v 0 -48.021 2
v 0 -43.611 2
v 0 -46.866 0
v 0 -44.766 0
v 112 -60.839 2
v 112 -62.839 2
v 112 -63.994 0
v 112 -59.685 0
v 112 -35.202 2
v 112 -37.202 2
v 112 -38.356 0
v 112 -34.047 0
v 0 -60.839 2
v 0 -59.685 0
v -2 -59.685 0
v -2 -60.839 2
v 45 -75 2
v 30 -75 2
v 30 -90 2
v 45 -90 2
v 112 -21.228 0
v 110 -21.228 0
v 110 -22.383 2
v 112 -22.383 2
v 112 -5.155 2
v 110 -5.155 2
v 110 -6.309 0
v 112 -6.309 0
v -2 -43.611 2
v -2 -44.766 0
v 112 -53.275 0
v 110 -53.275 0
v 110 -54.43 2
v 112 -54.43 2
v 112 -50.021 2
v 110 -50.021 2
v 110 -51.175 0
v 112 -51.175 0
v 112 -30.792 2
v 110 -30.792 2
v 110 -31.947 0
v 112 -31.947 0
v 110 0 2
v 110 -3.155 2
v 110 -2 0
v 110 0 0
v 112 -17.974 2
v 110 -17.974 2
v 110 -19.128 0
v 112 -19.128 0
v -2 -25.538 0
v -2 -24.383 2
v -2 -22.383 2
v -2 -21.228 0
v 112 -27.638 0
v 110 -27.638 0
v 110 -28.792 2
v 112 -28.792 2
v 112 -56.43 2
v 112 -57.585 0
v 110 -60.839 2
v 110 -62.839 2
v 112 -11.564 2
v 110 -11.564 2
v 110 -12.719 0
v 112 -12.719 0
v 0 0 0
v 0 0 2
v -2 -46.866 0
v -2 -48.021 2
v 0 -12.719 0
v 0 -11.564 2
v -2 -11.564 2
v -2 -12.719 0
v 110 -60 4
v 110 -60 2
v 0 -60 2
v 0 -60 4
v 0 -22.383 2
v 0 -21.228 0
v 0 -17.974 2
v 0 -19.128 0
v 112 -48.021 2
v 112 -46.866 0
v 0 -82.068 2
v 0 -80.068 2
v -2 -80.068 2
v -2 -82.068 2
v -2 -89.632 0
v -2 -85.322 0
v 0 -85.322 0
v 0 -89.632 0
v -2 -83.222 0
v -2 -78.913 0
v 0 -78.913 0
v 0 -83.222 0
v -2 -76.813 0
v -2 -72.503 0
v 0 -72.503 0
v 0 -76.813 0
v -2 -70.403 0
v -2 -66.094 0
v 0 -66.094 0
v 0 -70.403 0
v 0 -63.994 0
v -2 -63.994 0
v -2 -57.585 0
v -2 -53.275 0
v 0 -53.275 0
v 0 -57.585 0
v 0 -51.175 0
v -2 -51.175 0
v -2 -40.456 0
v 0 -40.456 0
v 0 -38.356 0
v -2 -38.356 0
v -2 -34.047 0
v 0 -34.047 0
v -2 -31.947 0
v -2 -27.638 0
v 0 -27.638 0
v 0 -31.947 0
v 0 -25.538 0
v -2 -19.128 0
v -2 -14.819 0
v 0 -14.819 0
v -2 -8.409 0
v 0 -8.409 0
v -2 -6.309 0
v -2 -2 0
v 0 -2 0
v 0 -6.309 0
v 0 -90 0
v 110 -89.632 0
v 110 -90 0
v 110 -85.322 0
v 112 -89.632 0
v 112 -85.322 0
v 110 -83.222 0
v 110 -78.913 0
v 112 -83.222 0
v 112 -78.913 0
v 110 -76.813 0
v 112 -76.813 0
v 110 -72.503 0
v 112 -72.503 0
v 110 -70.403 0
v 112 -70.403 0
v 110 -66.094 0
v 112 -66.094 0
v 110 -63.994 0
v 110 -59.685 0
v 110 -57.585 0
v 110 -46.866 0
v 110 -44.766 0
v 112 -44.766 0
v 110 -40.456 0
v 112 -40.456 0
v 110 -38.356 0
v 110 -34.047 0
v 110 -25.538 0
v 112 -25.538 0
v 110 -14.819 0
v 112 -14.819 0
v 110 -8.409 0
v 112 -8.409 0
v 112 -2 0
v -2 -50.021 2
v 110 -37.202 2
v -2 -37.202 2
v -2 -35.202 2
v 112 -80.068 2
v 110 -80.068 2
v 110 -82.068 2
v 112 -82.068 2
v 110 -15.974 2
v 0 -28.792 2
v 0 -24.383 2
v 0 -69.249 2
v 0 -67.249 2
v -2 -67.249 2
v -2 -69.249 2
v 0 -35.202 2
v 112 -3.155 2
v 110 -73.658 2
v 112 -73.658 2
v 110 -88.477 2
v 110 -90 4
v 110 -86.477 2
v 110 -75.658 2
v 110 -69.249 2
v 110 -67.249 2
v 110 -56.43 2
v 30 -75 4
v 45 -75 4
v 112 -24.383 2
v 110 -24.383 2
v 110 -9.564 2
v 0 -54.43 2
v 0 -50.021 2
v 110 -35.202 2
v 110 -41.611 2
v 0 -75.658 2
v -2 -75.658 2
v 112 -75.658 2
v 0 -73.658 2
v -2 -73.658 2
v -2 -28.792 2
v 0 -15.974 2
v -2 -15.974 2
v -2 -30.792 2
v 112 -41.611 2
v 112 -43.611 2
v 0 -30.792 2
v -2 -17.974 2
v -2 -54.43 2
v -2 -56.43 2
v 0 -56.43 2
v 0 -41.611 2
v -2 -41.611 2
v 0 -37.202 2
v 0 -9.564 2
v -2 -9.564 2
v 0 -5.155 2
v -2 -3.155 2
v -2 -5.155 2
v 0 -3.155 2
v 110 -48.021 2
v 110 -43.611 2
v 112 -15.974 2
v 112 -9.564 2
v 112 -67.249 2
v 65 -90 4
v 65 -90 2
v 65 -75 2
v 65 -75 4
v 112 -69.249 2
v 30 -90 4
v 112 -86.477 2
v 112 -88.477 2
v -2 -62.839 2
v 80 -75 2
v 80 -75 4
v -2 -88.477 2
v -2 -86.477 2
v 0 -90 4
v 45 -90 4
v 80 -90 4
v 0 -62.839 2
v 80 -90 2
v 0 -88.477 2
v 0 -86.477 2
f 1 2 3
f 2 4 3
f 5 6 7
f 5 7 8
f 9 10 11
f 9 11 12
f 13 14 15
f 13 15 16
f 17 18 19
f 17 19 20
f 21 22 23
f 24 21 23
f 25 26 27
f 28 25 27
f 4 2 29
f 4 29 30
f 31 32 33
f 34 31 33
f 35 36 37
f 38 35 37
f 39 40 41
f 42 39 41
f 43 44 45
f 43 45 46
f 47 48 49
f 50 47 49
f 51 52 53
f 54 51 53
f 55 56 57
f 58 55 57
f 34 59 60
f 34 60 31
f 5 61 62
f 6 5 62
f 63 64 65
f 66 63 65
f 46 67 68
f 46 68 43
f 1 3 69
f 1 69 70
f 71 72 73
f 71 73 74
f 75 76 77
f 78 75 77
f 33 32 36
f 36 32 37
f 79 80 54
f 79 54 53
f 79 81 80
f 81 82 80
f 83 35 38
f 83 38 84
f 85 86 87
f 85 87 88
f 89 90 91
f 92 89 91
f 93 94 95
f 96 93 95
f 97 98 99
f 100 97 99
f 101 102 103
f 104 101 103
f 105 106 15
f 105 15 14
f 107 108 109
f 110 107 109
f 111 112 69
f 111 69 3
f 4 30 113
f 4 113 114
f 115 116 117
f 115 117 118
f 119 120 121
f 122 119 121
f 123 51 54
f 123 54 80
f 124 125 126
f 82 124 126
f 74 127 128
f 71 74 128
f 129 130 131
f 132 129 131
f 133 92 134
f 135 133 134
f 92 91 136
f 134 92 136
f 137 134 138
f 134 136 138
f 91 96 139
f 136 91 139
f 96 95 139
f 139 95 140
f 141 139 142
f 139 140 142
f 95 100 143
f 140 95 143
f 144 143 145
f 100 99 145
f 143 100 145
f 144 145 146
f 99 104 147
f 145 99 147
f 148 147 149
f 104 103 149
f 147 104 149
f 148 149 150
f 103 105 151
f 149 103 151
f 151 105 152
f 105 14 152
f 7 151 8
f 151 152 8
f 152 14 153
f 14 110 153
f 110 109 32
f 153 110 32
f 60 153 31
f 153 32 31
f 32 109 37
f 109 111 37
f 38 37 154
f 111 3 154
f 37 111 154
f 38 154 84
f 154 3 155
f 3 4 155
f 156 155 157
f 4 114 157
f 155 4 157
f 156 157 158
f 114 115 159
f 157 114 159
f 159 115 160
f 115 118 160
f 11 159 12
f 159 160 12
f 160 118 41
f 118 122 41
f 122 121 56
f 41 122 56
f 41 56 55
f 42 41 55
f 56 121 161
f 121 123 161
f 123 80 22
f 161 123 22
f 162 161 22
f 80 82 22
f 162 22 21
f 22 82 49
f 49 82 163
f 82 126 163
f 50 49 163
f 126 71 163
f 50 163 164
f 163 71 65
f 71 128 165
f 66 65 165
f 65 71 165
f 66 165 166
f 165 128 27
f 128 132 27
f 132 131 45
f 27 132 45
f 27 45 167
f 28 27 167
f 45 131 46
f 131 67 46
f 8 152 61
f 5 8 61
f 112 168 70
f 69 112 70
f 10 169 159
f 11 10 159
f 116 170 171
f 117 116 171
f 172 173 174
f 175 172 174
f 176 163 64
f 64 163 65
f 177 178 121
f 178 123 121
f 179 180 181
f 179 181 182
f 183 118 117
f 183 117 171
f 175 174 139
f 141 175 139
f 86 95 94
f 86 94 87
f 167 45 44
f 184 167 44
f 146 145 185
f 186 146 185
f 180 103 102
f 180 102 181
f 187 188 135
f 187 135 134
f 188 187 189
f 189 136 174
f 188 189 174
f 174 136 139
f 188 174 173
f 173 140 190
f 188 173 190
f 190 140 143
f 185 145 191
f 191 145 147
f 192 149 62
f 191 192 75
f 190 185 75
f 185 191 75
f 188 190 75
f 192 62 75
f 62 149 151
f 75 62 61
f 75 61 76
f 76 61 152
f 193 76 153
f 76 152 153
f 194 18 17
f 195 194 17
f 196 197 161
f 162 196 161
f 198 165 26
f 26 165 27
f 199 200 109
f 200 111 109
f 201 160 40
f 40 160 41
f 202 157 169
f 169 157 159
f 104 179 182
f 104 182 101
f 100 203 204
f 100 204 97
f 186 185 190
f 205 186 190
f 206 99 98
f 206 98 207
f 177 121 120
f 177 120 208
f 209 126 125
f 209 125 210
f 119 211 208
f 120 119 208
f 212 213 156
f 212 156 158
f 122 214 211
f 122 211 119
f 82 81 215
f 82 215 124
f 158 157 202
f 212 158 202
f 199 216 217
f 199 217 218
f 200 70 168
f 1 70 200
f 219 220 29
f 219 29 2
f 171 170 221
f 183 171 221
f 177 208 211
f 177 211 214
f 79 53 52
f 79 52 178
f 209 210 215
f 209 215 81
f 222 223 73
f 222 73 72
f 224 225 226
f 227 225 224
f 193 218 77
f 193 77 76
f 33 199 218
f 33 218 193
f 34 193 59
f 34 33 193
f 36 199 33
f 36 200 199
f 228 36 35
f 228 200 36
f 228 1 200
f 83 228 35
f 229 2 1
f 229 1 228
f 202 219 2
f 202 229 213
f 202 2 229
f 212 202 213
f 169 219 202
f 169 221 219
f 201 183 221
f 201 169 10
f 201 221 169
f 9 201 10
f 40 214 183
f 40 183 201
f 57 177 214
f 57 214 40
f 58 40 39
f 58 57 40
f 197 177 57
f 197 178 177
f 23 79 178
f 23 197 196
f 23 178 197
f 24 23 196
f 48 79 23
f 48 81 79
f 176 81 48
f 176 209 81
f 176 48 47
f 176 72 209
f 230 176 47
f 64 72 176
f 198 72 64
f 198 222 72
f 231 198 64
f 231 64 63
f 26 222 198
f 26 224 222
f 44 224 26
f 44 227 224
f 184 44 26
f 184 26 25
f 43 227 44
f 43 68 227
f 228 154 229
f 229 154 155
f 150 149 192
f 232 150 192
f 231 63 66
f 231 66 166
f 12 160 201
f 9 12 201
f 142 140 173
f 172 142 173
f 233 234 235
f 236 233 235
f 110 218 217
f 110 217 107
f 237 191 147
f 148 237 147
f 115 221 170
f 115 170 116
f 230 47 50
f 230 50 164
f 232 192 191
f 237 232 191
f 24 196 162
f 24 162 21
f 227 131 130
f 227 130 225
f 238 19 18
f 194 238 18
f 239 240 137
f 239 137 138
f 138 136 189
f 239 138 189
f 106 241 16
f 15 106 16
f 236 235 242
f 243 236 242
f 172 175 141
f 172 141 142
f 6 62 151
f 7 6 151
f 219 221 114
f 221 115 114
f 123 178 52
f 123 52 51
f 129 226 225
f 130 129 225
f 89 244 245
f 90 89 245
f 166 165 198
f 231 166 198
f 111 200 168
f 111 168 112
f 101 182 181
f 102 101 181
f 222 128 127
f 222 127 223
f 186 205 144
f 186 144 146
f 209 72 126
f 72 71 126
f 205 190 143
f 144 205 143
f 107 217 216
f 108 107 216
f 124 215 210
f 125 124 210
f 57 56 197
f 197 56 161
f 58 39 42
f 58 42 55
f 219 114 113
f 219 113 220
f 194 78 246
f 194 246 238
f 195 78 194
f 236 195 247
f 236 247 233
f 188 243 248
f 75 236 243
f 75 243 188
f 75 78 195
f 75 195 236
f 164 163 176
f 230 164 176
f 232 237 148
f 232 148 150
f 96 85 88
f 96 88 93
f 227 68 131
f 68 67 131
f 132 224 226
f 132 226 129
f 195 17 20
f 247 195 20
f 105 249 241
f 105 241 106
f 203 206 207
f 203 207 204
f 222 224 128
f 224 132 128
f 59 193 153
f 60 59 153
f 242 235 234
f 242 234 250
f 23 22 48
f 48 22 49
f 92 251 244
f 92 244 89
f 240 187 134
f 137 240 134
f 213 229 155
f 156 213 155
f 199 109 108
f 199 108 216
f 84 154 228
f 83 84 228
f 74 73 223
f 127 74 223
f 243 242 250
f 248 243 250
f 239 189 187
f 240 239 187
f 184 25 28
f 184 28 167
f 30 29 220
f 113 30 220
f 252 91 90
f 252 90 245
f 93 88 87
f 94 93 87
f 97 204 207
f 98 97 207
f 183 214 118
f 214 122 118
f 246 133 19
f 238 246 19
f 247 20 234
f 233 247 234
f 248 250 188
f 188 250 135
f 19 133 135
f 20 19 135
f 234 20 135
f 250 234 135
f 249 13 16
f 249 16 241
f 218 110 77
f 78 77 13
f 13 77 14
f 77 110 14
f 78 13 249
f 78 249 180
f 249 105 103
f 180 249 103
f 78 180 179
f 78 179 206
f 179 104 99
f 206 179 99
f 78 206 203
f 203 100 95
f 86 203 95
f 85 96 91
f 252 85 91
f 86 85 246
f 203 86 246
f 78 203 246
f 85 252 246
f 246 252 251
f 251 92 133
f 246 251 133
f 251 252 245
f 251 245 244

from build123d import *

# Parameters (mm, degrees)
SKETCH_W               = 110
SKETCH_H               = 90
PAD_DEPTH              = 2
PAD001_DEPTH           = 2
PAD002_DEPTH           = 2
LINEARPATTERN_COUNT    = 14
LINEARPATTERN_PITCH    = 6.409401
PAD003_DEPTH           = 2
LINEARPATTERN001_COUNT = 14
LINEARPATTERN001_PITCH = 6.409401


with BuildPart() as part:
    # Sketch → Pad (new body)
    with BuildSketch(Plane.XY):
        with Locations((55, -45)):
            Rectangle(SKETCH_W, SKETCH_H)
    extrude(amount=PAD_DEPTH)

    # Sketch001 (on Face6 of Pad) → Pad001 (join)
    with BuildSketch(Plane.XY.offset(2)):
        Polygon((110, -90), (110, -60), (0, -60), (0, -90), (30, -90), (30, -75), (45, -75), (45, -90), (65, -90), (65, -75), (80, -75), (80, -90), align=None)
    extrude(amount=PAD001_DEPTH)

    # Sketch002 (on Face2 of Pad001) → Pad002 (join)
    with BuildSketch(Plane(origin=(0, 0, 0), x_dir=(0, -1, 0), z_dir=(-1, 0, 0))):
        Polygon((2, 0), (3.154701, 2), (5.154701, 2), (6.309401, 0), align=None)
    pad002 = extrude(amount=PAD002_DEPTH)

    # LinearPattern: Pad002 ×14
    with Locations(*[(0, -i * LINEARPATTERN_PITCH, 0) for i in range(1, LINEARPATTERN_COUNT)]):
        add(pad002)

    # Sketch003 (on Face3 of LinearPattern) → Pad003 (join)
    with BuildSketch(Plane.YZ.offset(110)):
        Polygon((-2, 0), (-3.154701, 2), (-5.154701, 2), (-6.309401, 0), align=None)
    pad003 = extrude(amount=PAD003_DEPTH)

    # LinearPattern001: Pad003 ×14
    with Locations(*[(0, -i * LINEARPATTERN001_PITCH, 0) for i in range(1, LINEARPATTERN001_COUNT)]):
        add(pad003)


solid = part.part
